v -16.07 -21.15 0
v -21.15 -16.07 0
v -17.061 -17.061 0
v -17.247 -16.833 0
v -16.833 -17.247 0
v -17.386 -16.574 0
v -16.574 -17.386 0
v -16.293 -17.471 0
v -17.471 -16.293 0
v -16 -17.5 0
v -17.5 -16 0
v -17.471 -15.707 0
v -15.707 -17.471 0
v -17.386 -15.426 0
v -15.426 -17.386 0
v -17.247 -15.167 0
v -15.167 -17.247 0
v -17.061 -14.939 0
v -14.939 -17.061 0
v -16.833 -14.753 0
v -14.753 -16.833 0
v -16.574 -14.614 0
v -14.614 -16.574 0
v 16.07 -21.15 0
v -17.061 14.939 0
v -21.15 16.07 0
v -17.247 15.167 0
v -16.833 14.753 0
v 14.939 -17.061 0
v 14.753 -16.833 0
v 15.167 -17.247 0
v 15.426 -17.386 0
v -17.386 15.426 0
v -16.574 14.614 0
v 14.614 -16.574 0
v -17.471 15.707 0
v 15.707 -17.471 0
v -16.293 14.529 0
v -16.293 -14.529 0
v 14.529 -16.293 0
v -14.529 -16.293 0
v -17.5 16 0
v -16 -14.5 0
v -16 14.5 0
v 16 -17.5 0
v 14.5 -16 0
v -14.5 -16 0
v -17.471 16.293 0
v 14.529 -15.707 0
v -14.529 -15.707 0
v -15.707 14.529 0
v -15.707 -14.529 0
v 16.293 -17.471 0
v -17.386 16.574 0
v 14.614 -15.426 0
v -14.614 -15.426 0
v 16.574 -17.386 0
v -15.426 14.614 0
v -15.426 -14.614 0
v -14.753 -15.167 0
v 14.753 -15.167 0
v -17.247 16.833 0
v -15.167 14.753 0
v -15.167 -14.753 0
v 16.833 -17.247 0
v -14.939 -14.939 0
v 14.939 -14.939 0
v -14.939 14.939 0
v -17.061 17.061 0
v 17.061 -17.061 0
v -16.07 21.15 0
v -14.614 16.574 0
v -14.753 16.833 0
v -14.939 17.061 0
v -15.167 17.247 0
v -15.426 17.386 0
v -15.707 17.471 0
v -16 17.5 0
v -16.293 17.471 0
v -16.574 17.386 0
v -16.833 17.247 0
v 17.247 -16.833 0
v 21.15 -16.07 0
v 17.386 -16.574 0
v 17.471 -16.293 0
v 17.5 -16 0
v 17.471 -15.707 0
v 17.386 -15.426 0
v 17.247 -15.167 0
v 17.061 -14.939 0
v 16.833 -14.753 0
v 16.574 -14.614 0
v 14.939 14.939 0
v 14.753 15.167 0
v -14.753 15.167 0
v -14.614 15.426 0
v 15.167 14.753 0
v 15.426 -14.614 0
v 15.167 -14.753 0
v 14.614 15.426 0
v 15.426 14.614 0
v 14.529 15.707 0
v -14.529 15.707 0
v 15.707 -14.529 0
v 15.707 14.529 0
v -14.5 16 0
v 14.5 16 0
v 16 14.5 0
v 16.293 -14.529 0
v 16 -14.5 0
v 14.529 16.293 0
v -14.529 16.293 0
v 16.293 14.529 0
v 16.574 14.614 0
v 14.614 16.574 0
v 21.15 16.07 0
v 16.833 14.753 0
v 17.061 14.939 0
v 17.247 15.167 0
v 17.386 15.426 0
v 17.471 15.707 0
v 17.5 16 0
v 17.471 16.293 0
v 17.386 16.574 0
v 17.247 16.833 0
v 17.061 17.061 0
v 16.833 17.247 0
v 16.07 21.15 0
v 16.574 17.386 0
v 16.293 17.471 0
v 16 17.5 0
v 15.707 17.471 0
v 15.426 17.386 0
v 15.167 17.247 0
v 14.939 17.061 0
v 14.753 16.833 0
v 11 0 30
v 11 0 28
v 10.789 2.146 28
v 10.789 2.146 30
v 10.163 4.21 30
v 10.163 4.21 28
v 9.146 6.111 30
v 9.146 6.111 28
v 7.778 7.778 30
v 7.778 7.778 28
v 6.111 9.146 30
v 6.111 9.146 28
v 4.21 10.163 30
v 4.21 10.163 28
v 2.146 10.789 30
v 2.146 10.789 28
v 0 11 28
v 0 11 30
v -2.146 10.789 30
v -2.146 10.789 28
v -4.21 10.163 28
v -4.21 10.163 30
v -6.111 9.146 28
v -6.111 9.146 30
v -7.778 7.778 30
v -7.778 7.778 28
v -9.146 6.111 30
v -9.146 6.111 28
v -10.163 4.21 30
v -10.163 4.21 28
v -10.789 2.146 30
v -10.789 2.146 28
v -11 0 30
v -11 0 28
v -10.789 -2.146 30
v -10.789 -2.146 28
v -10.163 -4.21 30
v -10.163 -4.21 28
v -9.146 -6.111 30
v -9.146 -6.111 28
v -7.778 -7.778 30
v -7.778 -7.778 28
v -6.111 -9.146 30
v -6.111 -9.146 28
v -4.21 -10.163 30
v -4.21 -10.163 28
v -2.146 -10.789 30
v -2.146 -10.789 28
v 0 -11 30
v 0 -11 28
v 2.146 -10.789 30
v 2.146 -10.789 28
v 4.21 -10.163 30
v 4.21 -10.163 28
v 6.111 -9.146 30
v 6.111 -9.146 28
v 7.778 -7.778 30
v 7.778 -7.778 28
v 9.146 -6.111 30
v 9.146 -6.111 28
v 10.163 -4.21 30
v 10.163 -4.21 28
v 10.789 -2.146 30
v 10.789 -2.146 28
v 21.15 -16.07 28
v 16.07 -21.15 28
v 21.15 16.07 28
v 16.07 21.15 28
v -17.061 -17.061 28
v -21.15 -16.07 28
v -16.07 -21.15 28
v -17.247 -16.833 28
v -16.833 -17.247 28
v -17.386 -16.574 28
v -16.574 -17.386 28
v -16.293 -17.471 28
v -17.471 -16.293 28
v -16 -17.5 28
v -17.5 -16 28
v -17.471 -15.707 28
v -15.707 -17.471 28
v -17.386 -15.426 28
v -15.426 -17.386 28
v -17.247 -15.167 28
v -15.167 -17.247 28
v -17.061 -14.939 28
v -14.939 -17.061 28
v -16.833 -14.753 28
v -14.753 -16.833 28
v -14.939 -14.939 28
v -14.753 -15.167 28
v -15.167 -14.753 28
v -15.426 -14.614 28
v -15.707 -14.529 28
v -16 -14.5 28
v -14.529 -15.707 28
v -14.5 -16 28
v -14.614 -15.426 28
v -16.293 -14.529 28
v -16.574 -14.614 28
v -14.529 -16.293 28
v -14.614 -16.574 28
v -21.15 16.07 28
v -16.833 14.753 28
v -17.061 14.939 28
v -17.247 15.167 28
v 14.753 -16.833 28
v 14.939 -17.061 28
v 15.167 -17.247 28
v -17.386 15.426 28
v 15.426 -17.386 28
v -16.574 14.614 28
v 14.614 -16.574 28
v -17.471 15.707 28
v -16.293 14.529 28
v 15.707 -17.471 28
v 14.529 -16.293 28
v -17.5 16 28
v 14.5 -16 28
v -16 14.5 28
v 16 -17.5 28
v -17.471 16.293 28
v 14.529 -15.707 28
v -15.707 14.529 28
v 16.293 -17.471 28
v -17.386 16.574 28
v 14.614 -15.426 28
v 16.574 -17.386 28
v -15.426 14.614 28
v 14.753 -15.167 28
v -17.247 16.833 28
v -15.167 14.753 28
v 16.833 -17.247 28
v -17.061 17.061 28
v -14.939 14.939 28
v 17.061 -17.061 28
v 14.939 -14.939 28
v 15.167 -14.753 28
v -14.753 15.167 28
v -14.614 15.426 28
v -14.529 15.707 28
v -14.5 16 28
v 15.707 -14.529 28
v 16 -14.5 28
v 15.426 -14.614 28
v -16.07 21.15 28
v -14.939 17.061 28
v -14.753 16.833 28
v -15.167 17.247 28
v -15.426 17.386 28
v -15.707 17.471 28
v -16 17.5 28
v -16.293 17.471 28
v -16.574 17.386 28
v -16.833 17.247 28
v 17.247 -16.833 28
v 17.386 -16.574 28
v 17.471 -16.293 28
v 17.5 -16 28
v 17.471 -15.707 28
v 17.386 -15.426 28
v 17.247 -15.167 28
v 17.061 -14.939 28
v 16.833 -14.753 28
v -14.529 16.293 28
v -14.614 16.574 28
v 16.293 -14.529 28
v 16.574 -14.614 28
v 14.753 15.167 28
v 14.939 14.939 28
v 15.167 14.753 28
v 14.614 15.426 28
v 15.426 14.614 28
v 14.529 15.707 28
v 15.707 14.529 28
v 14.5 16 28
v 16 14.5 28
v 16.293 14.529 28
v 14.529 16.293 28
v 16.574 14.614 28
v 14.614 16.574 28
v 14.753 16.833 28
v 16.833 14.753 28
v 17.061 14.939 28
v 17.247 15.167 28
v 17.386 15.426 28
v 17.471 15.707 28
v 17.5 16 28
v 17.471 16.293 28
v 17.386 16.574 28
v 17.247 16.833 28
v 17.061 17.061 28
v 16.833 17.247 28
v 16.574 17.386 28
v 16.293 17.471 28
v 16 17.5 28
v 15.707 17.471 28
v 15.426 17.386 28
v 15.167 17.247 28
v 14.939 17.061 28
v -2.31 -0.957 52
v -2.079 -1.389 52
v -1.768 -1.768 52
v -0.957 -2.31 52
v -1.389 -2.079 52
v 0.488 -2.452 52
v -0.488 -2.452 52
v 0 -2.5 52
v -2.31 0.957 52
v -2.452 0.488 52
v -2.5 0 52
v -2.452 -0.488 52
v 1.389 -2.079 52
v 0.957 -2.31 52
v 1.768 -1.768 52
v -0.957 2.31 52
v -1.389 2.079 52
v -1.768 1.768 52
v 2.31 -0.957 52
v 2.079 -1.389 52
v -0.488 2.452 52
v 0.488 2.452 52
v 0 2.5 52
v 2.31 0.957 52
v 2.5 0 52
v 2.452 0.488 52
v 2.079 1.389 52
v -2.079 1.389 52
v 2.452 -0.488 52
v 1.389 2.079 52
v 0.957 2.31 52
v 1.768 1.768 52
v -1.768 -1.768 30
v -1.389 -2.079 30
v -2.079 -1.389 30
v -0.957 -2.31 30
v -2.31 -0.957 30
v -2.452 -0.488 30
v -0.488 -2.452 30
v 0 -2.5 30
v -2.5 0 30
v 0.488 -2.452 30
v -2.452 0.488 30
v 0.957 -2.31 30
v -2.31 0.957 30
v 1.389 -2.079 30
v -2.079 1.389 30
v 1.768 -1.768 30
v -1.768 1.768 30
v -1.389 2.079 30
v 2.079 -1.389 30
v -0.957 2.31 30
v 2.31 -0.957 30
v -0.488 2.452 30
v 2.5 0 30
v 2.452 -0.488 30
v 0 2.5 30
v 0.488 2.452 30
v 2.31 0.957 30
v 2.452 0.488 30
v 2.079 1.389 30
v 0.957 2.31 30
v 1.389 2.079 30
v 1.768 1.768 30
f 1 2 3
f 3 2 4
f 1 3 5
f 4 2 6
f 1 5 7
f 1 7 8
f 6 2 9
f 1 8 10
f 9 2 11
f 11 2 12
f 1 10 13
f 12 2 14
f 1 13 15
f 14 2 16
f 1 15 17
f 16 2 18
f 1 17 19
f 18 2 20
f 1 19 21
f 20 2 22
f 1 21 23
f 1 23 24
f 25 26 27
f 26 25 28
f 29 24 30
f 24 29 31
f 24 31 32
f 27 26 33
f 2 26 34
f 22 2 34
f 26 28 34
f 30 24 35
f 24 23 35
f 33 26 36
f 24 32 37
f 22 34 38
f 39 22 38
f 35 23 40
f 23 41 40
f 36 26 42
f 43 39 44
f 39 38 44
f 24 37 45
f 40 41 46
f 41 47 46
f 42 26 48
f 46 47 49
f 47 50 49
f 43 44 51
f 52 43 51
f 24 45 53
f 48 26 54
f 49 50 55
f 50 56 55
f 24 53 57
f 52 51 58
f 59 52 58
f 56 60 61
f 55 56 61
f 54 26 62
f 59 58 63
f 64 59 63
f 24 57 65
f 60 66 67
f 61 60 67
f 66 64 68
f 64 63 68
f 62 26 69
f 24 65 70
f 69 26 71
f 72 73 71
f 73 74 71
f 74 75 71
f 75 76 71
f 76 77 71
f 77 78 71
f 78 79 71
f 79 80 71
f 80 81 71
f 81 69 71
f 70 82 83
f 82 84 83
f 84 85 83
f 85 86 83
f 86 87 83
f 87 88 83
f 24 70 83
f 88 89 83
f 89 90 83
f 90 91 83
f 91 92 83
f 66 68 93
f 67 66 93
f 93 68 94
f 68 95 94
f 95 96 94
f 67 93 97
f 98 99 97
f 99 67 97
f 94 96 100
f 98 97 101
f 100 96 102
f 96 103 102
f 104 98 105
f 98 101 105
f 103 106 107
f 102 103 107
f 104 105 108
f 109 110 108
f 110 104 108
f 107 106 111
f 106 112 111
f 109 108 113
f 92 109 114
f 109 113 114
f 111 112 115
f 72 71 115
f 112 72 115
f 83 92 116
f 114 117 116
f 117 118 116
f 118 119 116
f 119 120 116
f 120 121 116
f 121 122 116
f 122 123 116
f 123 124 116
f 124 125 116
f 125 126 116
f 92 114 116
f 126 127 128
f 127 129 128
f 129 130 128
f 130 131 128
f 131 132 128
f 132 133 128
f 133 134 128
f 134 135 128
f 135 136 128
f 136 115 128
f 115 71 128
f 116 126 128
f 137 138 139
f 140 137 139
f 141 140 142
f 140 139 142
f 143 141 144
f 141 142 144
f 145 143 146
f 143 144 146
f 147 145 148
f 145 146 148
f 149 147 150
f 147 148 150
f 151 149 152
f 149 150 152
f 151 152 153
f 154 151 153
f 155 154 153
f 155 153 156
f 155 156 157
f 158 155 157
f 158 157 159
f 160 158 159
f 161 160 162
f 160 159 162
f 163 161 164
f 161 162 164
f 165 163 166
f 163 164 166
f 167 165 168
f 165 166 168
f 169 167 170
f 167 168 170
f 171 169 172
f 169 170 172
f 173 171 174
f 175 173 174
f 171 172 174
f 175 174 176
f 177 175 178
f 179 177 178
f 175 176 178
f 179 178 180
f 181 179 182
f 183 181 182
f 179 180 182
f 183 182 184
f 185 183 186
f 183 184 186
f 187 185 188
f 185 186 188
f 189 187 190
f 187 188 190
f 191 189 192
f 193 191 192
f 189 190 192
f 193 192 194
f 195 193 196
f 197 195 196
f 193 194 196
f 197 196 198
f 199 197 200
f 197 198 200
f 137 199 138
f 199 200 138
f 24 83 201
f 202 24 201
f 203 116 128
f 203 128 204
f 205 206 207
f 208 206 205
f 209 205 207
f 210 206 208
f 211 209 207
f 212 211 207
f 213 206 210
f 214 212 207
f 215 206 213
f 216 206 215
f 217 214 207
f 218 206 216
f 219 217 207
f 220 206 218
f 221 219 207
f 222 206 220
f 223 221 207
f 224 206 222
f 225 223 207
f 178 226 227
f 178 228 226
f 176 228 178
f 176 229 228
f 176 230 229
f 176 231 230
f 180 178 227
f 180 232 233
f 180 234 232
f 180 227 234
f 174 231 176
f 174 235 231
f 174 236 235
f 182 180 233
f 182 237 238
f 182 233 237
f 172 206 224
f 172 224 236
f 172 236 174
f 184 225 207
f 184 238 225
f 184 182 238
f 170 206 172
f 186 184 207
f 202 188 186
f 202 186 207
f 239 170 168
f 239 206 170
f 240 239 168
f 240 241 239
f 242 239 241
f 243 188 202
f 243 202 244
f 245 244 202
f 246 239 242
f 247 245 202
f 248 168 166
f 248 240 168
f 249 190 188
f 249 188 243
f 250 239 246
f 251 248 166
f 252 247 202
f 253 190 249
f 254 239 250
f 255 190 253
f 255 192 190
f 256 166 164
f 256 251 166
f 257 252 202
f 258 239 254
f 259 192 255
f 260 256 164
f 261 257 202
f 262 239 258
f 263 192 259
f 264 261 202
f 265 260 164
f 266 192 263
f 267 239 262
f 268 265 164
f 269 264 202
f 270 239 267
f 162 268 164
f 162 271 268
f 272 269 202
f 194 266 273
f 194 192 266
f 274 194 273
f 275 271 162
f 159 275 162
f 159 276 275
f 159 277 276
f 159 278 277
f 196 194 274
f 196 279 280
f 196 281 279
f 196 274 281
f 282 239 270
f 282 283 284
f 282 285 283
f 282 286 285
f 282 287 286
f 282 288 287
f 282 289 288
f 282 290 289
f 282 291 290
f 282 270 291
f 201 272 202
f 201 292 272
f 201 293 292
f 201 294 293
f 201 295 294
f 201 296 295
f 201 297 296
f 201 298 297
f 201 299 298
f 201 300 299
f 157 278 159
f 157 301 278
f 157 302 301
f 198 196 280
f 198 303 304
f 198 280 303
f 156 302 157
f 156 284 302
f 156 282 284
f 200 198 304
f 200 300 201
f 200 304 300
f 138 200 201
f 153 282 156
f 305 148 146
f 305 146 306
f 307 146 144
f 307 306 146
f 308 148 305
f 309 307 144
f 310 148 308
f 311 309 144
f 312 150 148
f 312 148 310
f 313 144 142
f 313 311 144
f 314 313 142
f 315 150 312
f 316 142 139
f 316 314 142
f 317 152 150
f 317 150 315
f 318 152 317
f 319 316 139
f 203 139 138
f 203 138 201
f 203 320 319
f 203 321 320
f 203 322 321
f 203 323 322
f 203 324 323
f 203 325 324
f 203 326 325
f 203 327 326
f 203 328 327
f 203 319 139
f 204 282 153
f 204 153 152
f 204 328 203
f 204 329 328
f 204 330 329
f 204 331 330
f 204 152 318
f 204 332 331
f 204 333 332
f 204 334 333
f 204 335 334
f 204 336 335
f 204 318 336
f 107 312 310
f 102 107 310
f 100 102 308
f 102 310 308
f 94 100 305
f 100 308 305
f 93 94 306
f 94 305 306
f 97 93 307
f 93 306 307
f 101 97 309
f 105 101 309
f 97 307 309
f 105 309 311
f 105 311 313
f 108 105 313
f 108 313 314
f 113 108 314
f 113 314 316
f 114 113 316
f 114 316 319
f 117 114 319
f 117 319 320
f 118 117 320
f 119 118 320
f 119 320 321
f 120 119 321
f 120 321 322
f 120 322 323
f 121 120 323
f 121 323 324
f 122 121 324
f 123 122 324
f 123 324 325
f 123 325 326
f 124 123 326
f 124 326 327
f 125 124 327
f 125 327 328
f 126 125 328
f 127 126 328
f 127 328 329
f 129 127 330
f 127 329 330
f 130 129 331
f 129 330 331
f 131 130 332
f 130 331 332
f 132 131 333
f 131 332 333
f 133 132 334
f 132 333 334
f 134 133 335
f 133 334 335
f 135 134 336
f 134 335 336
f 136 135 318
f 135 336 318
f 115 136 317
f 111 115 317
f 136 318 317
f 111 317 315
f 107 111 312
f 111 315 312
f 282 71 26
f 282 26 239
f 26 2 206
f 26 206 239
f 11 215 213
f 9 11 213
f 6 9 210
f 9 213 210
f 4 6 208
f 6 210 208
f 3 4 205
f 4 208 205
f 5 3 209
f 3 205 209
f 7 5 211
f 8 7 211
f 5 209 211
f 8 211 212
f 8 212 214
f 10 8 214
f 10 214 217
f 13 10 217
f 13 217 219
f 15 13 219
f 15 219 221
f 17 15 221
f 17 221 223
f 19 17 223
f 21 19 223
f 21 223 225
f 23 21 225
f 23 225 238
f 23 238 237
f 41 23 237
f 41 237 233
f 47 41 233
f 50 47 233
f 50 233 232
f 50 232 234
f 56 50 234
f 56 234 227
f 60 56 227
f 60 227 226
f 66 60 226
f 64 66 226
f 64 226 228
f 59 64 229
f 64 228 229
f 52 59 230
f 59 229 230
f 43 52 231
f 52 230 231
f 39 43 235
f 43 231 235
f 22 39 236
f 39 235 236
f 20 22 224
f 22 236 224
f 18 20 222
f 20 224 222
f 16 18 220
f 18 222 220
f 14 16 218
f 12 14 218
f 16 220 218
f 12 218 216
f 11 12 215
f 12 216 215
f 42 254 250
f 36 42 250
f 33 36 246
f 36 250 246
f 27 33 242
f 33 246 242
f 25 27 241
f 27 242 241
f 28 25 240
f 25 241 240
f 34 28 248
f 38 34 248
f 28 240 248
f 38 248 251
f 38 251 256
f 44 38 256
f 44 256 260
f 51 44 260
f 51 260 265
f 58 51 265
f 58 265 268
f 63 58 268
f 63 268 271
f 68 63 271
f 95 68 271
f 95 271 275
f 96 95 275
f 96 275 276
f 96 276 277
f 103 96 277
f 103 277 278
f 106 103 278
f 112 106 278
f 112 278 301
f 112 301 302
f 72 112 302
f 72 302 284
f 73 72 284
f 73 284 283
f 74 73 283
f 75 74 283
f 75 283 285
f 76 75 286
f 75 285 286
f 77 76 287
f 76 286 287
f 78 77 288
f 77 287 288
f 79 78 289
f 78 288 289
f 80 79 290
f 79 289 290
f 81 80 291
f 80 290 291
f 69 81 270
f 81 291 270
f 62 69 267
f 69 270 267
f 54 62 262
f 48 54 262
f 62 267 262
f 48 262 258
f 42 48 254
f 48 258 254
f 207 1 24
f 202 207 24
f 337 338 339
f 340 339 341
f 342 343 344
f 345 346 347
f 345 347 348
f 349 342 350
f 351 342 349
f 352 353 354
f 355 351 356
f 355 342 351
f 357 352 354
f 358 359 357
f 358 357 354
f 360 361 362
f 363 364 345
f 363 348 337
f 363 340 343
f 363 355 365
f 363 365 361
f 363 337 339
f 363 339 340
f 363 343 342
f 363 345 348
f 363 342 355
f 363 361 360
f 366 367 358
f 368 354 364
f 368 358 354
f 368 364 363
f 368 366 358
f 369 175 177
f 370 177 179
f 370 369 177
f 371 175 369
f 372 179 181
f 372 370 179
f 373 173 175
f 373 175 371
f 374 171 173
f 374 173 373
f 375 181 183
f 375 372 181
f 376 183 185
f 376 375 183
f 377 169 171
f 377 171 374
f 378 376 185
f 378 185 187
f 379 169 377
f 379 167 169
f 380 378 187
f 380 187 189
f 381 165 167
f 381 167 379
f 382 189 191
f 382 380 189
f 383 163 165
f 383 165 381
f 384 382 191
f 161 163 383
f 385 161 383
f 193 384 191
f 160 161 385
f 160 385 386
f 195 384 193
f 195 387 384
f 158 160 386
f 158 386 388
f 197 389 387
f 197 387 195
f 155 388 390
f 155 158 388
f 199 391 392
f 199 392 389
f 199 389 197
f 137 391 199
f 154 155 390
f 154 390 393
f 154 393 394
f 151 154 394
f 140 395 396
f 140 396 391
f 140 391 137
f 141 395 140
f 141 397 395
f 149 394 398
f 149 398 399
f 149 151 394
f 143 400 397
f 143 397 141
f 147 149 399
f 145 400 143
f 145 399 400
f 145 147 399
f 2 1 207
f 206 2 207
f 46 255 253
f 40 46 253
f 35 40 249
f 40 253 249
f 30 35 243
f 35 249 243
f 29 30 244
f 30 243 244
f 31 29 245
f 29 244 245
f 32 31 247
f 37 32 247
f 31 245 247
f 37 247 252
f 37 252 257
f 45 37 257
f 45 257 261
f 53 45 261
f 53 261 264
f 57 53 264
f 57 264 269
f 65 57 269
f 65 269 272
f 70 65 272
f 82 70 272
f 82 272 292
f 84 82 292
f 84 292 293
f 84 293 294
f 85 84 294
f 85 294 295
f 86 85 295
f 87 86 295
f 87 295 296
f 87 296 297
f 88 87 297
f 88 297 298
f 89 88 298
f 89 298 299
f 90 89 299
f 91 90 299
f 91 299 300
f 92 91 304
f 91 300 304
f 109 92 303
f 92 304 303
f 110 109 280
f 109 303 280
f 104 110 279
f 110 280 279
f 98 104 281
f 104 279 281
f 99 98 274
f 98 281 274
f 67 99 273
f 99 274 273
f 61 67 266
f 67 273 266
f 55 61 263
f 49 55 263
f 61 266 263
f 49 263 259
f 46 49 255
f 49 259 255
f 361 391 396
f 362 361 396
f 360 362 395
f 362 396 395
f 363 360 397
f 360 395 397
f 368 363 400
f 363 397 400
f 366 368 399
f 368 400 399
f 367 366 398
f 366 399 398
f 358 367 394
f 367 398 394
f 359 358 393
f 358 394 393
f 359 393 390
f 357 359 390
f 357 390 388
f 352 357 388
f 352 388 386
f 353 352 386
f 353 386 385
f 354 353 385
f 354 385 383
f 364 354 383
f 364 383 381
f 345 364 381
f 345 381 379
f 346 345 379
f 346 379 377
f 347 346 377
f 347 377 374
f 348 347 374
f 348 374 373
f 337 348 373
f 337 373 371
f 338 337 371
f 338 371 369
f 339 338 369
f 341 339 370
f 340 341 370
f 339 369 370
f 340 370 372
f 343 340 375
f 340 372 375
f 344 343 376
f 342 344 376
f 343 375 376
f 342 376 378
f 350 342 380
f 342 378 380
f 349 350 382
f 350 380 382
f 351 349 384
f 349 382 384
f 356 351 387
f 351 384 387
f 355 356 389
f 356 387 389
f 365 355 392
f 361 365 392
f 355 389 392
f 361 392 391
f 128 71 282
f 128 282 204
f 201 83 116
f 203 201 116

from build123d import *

# Parameters (mm, degrees)
F0_W     = 42.3
F0_H     = 42.3
F1_DEPTH = 28
F2_R     = 11
F3_DEPTH = 2
F4_R     = 2.5
F5_DEPTH = 24
F7_D     = 3
F8_SIZE  = 5.08


with BuildPart() as f1:
    # F0 (on Top) → F1 (new body)
    with BuildSketch(Plane.XY):
        Rectangle(F0_W, F0_H)
    extrude(amount=F1_DEPTH)

    # F2 (on face) → F3 (join)
    with BuildSketch(Plane.XY.offset(28)):
        Circle(F2_R)
    extrude(amount=F3_DEPTH)

    # F4 (on face) → F5 (join)
    with BuildSketch(Plane.XY.offset(28)):
        Circle(F4_R)
    extrude(amount=F5_DEPTH)

    # F7 (through all)
    with Locations(Plane(origin=(0, 0, 0), x_dir=(1, 0, 0), z_dir=(0, 0, -1))):
        with Locations((-16, 16), (16, 16), (-16, -16), (16, -16)):
            Hole(F7_D / 2)

    # F8
    f8_edges = [f1.edges().sort_by_distance(p)[0] for p in [
        (-21.15, -21.15, 14),
        (21.15, -21.15, 14),
        (21.15, 21.15, 14),
        (-21.15, 21.15, 14),
    ]]
    chamfer(f8_edges, length=F8_SIZE)


solid = f1.part
